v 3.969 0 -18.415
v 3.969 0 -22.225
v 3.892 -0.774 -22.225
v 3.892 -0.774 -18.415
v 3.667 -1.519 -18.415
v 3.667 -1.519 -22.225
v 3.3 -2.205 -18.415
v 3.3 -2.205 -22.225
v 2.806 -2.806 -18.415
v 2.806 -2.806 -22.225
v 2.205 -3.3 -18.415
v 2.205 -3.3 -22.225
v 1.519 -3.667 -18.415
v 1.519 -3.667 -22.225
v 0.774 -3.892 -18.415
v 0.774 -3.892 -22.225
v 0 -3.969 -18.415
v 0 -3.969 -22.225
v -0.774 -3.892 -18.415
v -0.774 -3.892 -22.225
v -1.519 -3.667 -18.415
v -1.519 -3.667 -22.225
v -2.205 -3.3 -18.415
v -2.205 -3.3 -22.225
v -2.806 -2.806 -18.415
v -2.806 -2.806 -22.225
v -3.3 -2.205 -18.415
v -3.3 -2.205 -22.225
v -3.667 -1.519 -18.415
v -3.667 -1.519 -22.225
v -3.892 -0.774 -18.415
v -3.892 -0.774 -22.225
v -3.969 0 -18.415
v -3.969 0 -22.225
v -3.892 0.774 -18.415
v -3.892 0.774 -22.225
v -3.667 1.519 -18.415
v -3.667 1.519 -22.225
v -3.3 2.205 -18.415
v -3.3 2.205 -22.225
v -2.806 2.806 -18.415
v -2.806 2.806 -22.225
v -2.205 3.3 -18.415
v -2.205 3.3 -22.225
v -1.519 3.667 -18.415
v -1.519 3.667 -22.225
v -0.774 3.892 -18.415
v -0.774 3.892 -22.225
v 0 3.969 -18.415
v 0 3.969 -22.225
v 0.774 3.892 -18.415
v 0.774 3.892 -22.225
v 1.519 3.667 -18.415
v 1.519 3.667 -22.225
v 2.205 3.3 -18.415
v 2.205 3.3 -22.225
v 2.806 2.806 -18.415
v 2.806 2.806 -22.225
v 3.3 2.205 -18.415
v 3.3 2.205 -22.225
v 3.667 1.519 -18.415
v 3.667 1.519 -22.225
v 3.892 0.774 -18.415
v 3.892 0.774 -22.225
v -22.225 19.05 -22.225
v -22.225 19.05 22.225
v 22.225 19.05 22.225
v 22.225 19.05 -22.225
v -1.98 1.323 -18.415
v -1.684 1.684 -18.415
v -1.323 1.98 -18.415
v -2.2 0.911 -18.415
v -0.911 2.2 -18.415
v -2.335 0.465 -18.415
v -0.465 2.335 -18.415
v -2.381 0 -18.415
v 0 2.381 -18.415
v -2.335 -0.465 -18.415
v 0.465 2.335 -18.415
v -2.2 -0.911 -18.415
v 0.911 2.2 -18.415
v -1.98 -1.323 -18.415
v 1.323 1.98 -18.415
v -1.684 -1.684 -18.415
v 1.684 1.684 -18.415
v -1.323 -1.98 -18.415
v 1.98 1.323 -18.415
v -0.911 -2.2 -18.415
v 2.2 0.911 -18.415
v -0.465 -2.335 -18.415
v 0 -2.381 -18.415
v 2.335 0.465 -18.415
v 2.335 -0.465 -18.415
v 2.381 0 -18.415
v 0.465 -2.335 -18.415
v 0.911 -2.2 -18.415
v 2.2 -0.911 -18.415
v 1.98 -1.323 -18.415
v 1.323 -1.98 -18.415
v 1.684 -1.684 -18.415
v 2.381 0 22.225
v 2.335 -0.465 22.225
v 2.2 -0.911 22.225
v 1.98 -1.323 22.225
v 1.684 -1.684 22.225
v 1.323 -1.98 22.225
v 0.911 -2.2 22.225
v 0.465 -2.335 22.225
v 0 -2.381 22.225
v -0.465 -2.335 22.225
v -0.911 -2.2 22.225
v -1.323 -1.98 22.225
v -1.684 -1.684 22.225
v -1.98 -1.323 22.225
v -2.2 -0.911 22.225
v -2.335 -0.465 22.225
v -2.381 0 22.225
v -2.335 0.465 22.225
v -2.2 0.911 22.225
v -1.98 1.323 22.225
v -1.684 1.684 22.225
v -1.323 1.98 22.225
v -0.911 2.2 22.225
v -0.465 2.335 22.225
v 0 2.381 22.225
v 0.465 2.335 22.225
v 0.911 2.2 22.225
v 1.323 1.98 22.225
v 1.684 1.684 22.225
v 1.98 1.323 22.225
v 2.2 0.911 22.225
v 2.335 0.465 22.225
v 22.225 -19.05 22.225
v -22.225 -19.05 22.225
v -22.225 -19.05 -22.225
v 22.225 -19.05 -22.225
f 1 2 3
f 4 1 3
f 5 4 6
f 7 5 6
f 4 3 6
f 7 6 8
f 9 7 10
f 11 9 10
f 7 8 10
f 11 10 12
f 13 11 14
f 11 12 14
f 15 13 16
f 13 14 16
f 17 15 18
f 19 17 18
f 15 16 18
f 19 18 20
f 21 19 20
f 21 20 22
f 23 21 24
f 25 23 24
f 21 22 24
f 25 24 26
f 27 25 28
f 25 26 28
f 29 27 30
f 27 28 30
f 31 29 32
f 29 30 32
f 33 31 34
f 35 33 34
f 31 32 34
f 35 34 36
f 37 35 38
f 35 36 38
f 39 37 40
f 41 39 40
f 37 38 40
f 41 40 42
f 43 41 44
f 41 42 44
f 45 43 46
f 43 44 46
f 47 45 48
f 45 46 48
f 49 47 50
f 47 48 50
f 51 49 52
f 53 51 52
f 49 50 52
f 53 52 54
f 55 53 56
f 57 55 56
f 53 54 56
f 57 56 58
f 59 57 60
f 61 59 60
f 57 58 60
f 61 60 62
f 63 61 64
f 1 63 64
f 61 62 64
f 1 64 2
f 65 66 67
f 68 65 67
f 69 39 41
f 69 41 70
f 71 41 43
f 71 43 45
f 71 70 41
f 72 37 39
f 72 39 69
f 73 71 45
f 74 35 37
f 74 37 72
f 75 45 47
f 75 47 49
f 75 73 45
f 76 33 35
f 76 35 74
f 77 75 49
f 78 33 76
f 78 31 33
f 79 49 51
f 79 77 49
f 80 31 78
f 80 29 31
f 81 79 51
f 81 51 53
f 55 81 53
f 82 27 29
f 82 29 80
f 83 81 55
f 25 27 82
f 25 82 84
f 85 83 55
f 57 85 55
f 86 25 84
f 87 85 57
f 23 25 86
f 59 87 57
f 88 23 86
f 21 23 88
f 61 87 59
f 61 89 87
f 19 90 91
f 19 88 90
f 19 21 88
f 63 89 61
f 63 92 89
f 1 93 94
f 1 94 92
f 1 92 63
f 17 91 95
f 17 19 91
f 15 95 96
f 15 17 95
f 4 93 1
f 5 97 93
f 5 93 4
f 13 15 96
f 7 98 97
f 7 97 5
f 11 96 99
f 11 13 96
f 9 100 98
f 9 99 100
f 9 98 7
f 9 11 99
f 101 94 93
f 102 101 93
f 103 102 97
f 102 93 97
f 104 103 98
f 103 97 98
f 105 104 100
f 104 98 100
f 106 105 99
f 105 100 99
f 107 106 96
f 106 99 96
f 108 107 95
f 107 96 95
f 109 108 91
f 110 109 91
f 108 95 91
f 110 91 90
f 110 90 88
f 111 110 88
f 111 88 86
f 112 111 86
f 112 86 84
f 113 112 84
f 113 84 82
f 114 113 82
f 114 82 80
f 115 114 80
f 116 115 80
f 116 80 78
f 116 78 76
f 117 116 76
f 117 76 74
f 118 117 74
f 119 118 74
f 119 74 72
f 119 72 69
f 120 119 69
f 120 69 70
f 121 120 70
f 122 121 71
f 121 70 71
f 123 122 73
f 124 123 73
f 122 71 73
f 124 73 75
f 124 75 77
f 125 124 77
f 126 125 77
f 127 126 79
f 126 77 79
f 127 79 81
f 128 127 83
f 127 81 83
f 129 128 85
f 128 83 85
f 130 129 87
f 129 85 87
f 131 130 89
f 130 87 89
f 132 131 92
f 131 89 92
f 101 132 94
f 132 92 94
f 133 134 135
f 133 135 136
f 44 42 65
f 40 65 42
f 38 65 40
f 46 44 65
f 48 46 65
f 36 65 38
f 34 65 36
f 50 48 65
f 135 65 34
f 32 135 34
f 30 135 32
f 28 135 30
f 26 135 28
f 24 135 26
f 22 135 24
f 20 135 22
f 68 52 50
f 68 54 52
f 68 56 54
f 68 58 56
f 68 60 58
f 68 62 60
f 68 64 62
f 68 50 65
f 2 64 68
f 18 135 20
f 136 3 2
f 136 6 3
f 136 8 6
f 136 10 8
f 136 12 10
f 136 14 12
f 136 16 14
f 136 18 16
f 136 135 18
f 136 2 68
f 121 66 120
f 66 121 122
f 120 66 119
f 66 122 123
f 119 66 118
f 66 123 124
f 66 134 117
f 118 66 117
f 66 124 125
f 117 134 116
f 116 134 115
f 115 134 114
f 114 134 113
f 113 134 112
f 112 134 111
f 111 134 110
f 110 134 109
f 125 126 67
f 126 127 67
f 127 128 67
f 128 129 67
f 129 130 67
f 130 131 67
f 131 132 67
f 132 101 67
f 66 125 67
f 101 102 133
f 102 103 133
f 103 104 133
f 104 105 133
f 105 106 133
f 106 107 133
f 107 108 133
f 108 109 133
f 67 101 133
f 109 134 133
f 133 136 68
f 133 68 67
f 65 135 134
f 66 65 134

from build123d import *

# Parameters (mm, degrees)
F0_W     = 44.45
F0_H     = 44.45
F1_DEPTH = 19.05
F2_R     = 2.38125
F3_DEPTH = 44.451
F2_R_2   = 3.96875
F4_DEPTH = 3.81


with BuildPart() as f1:
    # F0 (on Front) → F1 (new body, symmetric)
    with BuildSketch(Plane.XZ):
        Rectangle(F0_W, F0_H)
    extrude(amount=F1_DEPTH, both=True)

    # F2 (on face) → F3 (cut, through all)
    with BuildSketch(Plane(origin=(0, 0, -22.225), x_dir=(1, 0, 0), z_dir=(0, 0, -1))):
        Circle(F2_R)
    extrude(amount=-F3_DEPTH, mode=Mode.SUBTRACT)

    # F2 (on face) → F4 (cut)
    with BuildSketch(Plane(origin=(0, 0, -22.225), x_dir=(1, 0, 0), z_dir=(0, 0, -1))):
        Circle(F2_R_2)
        Circle(F2_R, mode=Mode.SUBTRACT)
    extrude(amount=-F4_DEPTH, mode=Mode.SUBTRACT)


solid = f1.part
